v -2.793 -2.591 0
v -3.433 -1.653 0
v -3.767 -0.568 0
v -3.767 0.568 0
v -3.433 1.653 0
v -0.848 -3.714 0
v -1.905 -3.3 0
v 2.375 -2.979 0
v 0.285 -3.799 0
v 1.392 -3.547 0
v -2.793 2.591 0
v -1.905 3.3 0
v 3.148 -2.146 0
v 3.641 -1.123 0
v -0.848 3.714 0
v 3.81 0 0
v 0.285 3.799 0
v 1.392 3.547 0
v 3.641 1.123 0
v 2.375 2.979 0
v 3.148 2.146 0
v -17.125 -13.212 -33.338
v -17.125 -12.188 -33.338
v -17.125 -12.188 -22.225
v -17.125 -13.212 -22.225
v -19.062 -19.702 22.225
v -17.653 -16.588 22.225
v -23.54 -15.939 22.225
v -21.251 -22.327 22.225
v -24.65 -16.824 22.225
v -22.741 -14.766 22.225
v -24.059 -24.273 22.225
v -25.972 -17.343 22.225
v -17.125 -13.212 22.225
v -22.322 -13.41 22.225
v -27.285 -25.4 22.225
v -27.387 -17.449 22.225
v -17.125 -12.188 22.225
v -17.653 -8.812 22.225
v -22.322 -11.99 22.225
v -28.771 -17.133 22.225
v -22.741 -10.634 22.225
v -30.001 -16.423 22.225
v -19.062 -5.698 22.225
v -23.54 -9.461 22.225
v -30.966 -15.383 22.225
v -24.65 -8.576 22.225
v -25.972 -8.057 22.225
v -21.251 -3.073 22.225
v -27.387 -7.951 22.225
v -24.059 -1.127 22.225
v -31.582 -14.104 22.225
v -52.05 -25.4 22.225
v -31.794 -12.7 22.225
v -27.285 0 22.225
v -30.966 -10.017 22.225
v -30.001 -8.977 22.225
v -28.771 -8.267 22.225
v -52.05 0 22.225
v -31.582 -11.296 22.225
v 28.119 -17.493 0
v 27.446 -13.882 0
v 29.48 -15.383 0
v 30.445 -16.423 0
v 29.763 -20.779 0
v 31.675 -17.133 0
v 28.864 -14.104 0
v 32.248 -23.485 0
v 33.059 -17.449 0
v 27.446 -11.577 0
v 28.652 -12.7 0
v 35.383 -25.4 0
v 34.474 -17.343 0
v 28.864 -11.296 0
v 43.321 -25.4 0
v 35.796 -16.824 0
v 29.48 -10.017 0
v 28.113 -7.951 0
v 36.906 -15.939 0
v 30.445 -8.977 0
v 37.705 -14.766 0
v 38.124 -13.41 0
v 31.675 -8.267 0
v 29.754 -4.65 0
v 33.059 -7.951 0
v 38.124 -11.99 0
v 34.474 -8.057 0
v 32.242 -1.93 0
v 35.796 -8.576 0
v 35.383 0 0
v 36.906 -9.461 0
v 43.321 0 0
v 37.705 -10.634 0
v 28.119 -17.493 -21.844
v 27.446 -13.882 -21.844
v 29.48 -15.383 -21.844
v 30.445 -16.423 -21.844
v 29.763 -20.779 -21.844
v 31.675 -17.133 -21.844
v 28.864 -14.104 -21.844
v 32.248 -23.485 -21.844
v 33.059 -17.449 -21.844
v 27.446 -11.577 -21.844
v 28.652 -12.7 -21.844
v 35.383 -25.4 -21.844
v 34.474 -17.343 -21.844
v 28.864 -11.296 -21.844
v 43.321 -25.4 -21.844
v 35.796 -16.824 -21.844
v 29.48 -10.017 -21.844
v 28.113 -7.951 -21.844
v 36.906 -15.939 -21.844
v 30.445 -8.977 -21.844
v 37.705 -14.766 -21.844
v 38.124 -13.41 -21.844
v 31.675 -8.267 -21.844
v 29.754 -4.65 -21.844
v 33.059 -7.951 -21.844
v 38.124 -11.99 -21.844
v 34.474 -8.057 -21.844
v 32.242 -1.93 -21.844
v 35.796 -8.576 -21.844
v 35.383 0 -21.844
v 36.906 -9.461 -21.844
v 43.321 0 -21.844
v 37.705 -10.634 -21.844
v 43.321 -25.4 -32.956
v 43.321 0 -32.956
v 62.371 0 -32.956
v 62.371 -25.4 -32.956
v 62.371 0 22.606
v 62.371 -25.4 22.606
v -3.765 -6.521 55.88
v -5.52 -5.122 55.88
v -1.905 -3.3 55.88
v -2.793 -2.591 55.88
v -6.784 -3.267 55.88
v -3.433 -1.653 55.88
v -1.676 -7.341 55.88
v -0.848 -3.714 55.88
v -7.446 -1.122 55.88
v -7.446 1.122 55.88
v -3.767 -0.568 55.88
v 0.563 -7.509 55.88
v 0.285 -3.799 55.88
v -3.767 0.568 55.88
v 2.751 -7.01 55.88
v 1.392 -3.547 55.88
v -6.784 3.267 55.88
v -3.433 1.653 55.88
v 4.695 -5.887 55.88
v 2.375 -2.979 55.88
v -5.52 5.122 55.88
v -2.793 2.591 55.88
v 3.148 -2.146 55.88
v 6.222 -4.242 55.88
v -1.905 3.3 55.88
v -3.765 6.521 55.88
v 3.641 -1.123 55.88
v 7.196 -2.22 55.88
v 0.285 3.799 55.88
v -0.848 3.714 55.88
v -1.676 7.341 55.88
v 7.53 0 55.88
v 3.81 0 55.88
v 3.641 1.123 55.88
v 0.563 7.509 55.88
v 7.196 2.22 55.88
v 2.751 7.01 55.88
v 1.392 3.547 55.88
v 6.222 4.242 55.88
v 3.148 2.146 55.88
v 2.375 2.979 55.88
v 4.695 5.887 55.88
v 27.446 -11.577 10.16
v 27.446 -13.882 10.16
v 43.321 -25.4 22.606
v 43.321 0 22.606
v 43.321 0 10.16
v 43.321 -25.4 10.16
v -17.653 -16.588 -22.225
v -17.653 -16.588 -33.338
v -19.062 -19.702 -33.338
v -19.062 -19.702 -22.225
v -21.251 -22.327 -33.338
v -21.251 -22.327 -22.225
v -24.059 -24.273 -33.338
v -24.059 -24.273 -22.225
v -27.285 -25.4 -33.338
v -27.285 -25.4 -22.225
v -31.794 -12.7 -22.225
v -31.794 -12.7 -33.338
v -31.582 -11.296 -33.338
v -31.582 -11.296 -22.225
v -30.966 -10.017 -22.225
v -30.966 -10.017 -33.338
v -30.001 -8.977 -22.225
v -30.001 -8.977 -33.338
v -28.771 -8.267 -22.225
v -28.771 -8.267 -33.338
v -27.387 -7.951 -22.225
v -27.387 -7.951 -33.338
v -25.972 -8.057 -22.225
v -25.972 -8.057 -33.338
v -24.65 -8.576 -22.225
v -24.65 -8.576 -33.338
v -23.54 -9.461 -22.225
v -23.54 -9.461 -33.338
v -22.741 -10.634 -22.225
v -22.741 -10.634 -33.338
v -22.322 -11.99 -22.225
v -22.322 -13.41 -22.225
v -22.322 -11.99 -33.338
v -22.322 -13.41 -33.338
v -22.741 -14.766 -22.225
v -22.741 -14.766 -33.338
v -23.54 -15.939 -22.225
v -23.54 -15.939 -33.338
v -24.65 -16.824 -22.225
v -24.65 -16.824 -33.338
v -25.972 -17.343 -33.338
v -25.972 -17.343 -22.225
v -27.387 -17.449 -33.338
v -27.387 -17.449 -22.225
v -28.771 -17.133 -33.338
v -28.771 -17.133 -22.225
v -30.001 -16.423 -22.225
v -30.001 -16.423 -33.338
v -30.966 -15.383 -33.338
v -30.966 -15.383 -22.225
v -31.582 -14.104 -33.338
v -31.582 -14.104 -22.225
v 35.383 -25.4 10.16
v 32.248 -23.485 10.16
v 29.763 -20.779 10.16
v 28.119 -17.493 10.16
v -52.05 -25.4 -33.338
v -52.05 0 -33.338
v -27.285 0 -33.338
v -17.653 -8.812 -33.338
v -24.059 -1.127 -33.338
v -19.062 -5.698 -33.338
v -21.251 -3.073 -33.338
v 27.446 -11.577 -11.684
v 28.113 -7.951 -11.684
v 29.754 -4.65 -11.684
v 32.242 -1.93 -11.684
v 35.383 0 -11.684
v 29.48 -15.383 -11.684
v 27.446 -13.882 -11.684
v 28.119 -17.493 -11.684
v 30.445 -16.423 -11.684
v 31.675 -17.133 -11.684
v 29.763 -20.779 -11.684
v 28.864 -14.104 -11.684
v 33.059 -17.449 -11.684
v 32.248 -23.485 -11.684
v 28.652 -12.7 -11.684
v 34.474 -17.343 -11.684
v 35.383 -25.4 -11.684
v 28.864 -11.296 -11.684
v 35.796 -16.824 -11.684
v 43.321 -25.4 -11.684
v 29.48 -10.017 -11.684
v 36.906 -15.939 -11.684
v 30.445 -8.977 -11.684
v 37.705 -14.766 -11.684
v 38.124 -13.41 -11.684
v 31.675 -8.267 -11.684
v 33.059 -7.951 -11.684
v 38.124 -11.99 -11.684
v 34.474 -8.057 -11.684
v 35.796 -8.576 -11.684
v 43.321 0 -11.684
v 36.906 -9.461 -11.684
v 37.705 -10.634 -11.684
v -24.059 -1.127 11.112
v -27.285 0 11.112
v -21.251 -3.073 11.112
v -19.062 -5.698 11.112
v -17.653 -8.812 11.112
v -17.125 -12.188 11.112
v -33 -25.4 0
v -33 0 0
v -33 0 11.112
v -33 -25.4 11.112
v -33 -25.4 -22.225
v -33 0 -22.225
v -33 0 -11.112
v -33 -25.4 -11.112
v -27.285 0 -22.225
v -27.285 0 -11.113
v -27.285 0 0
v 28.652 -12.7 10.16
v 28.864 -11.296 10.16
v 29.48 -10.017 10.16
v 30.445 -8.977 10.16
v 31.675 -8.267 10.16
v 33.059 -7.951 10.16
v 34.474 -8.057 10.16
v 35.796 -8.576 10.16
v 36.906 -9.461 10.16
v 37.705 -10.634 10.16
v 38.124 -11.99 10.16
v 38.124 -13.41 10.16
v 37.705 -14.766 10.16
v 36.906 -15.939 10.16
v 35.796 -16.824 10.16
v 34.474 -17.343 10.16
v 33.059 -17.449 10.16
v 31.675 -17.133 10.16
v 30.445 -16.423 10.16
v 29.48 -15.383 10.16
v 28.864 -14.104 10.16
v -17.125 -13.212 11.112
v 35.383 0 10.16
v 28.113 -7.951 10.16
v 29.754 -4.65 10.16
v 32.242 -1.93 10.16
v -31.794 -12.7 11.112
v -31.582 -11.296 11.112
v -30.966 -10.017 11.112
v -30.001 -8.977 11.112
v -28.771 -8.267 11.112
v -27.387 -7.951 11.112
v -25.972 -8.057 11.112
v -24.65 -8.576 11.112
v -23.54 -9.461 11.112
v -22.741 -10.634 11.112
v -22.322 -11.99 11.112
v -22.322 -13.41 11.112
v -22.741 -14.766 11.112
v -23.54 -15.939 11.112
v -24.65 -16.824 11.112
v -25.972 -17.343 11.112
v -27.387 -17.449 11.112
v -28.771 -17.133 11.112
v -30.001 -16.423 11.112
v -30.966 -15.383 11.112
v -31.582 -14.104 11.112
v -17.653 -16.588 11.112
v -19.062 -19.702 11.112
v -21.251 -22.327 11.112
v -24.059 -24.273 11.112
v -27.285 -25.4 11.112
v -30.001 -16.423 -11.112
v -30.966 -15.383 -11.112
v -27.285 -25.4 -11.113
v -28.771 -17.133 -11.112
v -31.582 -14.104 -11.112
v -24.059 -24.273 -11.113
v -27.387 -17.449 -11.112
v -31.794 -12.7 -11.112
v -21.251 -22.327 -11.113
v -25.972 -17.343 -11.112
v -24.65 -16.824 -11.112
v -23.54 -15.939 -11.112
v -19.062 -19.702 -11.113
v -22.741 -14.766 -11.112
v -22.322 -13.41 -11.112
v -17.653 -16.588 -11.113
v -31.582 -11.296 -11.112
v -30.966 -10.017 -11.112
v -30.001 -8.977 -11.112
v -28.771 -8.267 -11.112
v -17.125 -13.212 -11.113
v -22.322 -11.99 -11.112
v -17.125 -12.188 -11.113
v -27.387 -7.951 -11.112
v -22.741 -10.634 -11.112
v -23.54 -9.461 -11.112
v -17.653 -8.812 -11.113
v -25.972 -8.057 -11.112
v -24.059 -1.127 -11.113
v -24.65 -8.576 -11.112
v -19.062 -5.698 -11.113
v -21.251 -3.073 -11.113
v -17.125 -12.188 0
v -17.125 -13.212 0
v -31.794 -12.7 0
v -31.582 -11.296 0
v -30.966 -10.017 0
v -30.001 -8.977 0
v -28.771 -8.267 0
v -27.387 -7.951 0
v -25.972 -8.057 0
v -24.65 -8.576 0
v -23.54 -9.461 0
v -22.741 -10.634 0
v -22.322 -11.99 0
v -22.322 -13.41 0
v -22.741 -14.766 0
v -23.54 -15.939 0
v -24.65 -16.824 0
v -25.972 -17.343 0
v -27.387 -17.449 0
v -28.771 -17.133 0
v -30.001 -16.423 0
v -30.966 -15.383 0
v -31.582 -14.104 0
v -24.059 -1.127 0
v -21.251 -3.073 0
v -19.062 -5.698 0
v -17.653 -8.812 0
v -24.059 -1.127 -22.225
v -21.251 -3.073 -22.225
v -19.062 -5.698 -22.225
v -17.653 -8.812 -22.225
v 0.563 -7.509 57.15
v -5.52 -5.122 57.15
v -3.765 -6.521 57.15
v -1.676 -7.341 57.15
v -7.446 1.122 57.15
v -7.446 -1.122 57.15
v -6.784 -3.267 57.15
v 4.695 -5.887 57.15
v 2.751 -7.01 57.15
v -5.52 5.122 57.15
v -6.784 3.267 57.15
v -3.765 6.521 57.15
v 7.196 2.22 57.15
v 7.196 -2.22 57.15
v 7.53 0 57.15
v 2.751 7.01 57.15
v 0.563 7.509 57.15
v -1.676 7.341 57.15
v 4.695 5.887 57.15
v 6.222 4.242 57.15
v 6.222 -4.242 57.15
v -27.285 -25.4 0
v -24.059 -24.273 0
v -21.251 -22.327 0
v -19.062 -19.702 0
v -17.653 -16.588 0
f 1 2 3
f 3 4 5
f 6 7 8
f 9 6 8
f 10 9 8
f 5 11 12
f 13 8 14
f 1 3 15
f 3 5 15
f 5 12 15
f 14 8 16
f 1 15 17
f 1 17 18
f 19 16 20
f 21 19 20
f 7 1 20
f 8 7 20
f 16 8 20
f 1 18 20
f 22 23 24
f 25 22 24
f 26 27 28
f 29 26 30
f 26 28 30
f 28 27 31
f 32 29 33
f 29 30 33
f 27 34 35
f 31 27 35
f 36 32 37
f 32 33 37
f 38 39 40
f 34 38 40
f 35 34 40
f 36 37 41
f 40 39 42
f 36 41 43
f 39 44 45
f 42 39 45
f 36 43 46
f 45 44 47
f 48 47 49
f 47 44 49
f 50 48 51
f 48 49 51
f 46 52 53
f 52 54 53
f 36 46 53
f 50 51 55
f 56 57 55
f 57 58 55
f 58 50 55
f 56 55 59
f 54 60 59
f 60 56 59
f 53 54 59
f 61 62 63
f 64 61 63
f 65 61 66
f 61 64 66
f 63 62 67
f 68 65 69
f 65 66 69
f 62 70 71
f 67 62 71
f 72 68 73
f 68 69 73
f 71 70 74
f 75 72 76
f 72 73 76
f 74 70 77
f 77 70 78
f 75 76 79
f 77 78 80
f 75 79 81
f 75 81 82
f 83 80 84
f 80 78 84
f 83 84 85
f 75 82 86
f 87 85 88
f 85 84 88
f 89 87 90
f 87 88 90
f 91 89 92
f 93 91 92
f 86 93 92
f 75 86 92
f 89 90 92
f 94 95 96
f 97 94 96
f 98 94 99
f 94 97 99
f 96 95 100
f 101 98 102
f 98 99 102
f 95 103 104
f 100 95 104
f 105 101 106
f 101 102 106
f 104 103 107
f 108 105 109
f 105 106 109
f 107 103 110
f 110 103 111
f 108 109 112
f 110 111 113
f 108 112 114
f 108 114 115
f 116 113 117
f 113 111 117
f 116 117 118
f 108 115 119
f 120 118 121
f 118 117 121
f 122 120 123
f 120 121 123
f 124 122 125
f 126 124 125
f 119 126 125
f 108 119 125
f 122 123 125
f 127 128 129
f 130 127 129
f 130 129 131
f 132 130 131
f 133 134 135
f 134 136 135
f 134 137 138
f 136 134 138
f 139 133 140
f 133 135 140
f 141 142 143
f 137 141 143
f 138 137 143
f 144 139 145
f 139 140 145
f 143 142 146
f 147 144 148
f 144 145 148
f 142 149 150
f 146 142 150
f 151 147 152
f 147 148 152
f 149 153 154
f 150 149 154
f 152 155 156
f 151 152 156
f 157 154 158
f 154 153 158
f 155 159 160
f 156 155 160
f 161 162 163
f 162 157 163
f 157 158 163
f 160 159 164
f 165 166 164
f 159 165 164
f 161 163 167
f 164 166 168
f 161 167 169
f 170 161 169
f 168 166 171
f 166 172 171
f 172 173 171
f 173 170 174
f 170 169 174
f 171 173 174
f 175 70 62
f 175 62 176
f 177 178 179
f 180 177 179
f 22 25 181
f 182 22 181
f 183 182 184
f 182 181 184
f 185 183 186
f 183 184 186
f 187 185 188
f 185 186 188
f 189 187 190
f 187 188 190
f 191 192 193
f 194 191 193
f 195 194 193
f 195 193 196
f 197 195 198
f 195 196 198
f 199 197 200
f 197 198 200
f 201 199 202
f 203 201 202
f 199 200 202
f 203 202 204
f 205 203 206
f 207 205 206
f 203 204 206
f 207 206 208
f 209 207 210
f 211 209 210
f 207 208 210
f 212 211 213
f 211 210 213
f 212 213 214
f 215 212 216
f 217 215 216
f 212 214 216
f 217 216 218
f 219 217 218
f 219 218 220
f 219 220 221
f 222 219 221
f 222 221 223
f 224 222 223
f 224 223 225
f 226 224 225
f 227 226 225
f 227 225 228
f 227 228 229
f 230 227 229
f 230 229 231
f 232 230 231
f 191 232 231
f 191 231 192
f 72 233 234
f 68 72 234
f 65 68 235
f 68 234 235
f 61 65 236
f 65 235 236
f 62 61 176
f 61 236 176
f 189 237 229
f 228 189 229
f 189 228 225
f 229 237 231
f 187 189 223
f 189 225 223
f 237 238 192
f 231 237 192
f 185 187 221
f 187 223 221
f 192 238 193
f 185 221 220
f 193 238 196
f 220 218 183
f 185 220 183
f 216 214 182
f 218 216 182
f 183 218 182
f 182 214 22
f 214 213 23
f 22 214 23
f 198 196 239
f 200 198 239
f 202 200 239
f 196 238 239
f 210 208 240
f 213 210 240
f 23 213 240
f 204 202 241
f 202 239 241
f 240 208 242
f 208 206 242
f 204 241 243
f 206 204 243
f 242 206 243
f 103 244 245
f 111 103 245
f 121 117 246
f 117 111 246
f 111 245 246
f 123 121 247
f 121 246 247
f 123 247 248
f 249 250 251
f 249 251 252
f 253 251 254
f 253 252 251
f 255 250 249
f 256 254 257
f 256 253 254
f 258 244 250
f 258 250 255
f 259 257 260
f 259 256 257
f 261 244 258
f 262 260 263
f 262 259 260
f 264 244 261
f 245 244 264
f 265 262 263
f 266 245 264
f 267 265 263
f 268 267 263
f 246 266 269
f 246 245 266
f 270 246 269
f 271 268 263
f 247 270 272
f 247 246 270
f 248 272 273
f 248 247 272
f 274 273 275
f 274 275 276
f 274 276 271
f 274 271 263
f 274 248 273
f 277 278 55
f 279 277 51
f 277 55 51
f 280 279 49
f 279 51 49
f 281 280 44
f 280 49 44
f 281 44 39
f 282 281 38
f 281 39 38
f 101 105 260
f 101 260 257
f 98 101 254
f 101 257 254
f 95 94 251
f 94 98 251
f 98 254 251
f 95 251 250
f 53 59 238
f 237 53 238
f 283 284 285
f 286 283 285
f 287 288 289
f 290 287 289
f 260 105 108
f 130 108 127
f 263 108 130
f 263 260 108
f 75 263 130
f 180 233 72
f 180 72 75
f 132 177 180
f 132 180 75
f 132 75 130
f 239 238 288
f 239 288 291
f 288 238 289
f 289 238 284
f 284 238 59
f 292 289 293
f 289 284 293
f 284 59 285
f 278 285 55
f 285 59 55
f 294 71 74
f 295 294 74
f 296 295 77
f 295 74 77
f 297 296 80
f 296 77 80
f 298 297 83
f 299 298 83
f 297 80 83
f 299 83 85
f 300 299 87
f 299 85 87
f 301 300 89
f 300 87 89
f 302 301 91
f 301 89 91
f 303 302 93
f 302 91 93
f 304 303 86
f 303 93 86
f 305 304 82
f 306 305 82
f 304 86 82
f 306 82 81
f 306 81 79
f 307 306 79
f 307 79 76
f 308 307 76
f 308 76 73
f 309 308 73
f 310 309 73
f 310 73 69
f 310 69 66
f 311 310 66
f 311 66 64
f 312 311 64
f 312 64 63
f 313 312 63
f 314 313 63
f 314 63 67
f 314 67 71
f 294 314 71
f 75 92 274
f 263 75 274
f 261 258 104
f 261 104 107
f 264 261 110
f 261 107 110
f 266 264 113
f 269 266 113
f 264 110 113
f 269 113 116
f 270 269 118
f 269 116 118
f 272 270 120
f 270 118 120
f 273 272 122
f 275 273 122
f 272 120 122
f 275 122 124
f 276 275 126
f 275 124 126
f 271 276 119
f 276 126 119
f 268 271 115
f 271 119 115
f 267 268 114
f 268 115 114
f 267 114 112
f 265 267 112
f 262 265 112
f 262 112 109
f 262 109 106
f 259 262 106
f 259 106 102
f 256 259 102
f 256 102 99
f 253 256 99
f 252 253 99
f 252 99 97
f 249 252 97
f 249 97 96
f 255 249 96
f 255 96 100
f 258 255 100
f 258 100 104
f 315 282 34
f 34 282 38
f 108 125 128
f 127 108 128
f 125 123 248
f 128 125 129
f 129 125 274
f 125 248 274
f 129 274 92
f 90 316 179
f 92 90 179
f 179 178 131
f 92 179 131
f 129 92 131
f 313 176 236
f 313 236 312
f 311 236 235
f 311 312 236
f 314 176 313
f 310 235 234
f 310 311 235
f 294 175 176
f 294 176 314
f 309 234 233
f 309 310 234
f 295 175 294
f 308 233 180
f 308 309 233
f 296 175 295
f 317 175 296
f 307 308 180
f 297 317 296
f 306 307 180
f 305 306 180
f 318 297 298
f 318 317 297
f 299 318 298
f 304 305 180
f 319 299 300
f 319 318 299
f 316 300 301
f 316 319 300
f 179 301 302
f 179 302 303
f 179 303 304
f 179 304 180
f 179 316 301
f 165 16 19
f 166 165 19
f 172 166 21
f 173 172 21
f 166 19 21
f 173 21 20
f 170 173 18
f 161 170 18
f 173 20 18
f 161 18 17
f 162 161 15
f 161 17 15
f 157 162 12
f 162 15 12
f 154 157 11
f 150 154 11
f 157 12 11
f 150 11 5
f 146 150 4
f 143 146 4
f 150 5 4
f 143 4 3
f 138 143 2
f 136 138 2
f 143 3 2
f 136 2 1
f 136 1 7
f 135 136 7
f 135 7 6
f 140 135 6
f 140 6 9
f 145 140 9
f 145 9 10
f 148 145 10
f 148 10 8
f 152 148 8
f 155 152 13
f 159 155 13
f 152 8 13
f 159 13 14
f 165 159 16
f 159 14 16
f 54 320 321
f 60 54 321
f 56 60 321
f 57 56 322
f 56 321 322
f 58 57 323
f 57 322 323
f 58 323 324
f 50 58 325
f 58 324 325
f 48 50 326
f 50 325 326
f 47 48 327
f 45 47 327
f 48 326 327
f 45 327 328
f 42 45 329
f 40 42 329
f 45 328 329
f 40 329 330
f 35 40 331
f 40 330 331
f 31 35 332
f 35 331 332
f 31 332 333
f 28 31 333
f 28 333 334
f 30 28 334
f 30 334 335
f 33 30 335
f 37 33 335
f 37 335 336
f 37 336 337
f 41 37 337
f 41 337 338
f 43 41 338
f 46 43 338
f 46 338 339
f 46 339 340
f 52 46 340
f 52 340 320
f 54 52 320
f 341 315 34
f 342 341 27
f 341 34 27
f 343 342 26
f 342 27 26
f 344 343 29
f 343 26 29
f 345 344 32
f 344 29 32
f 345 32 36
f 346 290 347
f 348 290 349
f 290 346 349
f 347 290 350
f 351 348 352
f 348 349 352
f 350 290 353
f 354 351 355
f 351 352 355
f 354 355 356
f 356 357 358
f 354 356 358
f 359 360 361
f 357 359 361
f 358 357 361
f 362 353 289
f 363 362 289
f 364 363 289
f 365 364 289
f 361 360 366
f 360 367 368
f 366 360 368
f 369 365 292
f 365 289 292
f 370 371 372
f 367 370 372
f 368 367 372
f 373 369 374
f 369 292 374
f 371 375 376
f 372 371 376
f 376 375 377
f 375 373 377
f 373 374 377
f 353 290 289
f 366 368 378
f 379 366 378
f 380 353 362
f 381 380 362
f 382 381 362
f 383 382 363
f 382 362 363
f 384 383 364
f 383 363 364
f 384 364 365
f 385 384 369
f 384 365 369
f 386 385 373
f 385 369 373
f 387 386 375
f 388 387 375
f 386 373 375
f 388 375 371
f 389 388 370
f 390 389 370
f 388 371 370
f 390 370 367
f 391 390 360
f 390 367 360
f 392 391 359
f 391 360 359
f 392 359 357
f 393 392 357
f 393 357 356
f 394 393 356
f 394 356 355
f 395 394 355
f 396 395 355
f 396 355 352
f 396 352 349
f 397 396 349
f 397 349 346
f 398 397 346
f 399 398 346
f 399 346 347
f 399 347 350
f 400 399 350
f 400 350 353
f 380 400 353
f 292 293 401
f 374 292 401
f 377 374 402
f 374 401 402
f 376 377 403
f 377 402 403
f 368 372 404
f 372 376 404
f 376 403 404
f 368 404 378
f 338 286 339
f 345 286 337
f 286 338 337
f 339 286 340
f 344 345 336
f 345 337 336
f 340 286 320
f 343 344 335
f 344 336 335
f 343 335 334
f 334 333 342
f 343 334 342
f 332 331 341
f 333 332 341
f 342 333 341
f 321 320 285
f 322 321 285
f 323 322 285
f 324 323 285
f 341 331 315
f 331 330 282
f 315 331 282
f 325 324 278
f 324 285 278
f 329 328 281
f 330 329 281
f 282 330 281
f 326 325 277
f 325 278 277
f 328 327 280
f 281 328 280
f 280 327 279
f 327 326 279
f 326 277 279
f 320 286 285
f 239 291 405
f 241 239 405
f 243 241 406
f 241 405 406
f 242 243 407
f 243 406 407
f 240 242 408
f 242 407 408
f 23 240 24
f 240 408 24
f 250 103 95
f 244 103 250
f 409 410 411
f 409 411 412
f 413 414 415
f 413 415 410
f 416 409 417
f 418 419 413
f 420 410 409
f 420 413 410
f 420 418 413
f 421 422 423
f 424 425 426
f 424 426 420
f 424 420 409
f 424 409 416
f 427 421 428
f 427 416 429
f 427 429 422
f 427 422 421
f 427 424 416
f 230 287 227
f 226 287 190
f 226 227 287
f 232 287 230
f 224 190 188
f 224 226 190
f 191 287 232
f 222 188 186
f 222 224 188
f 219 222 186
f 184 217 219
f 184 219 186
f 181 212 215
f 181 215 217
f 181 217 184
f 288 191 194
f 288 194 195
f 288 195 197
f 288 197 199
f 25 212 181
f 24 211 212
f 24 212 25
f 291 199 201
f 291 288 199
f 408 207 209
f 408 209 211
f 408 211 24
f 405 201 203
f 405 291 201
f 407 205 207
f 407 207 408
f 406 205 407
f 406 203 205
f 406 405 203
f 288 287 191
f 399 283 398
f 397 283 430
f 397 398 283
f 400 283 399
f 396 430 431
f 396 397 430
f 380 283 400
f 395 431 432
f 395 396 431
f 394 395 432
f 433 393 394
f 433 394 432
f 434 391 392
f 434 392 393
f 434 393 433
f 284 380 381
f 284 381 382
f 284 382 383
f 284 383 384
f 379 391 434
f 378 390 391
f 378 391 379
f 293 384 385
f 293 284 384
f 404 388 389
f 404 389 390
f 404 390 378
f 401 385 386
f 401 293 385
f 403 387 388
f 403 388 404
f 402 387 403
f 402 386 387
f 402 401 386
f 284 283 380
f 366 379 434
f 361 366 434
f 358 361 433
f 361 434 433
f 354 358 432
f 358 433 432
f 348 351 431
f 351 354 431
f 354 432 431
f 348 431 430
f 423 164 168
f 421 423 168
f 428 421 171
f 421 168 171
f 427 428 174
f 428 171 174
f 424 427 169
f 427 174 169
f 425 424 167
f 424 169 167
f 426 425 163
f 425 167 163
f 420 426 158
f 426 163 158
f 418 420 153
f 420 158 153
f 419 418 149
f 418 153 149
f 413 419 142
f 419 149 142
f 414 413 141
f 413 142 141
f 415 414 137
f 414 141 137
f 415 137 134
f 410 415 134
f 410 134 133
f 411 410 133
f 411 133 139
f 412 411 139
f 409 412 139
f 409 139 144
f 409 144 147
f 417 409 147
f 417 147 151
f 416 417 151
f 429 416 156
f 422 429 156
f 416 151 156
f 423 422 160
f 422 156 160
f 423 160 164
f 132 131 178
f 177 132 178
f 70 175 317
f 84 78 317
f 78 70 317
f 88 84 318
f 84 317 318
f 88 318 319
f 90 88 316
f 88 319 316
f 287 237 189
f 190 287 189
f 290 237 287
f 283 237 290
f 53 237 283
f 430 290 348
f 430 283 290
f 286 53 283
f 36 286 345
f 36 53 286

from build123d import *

# Parameters (mm, degrees)
F0_W      = 15.875
F0_H      = 11.1125
F1_DEPTH  = 25.4
F3_D      = 9.525
F4_W      = 15.875
F4_H      = 10.16
F5_DEPTH  = 25.4
F7_D      = 9.525
F8_R      = 3.81
F9_DEPTH  = 55.88
F10_R     = 7.5302035997
F10_R_2   = 3.81
F11_DEPTH = 1.27
F13_DEPTH = 76.2
F15_DEPTH = 76.2


with BuildPart() as f1:
    # F0 (on Front) → F1 (new body)
    with BuildSketch(Plane.XZ):
        Polygon((-33.0004044219, 22.225), (-52.0504044219, 22.225), (-52.0504044219, -33.3375), (-33.0004044219, -33.3375), (-33.0004044219, -22.225), (-33.0004044219, -11.1125), (-33.0004044219, 0), (-33.0004044219, 11.1125), align=None)
        with Locations((-25.0629044219, 16.66875)):
            Rectangle(F0_W, F0_H)
        with Locations((-25.0629044219, -5.55625)):
            Rectangle(F0_W, F0_H)
        with Locations((-25.0629044219, -27.78125)):
            Rectangle(F0_W, F0_H)
    extrude(amount=F1_DEPTH)

    # F3 (through all)
    with Locations(Plane.XY.offset(22.225)):
        with Locations((-27.0314044219, -12.7)):
            Hole(F3_D / 2)

    # F12 (on face) → F13 (cut)
    with BuildSketch(Plane.XY.offset(22.225)):
        with BuildLine():
            ThreePointArc((-27.2854044219, 0), (-20.0677675839, -4.3119668279), (-17.1254044219, -12.1878692189))
            Line((-17.1254044219, -12.1878692189), (-17.1254044219, 0))
            Line((-17.1254044219, 0), (-27.2854044219, 0))
        make_face()
        with BuildLine():
            Line((-17.1254044219, -25.4), (-17.1254044219, -13.2121307811))
            ThreePointArc((-17.1254044219, -13.2121307811), (-20.0677675839, -21.0880331721), (-27.2854044219, -25.4))
            Line((-27.2854044219, -25.4), (-17.1254044219, -25.4))
        make_face()
    extrude(amount=-F13_DEPTH, mode=Mode.SUBTRACT)


with BuildPart() as f5:
    # F4 (on Front) → F5 (new body)
    with BuildSketch(Plane.XZ):
        Polygon((62.3705395252, -32.9565), (62.3705395252, 22.606), (43.3205395252, 22.606), (43.3205395252, 10.16), (43.3205395252, 0), (43.3205395252, -11.684), (43.3205395252, -21.844), (43.3205395252, -32.9565), align=None)
        with Locations((35.3830395252, 5.08)):
            Rectangle(F4_W, F4_H)
        with Locations((35.3830395252, -16.764)):
            Rectangle(F4_W, F4_H)
    extrude(amount=F5_DEPTH)

    # F7 (through all)
    with Locations(Plane.XY.offset(10.16)):
        with Locations((33.4145395252, -12.7)):
            Hole(F7_D / 2)

    # F14 (on face) → F15 (cut)
    with BuildSketch(Plane.XY.offset(10.16)):
        with BuildLine():
            Line((27.4455395252, 0), (27.4455395252, -11.5768858415))
            ThreePointArc((27.4455395252, -11.5768858415), (29.7541859387, -4.6502203972), (35.3830395252, 0))
            Line((35.3830395252, 0), (27.4455395252, 0))
        make_face()
        with BuildLine():
            ThreePointArc((35.3830395252, -25.4), (29.76256364, -20.7789909403), (27.4455395252, -13.8815368334))
            Line((27.4455395252, -13.8815368334), (27.4455395252, -25.4))
            Line((27.4455395252, -25.4), (35.3830395252, -25.4))
        make_face()
    extrude(amount=-F15_DEPTH, mode=Mode.SUBTRACT)


with BuildPart() as f9:
    # F8 (on Top) → F9 (new body)
    with BuildSketch(Plane.XY):
        Circle(F8_R)
    extrude(amount=F9_DEPTH)

    # F10 (on face) → F11 (join)
    with BuildSketch(Plane.XY.offset(55.88)):
        Circle(F10_R)
        Circle(F10_R_2, mode=Mode.SUBTRACT)
        Circle(F10_R_2)
    extrude(amount=F11_DEPTH)


solid = Compound([f1.part, f5.part, f9.part])
